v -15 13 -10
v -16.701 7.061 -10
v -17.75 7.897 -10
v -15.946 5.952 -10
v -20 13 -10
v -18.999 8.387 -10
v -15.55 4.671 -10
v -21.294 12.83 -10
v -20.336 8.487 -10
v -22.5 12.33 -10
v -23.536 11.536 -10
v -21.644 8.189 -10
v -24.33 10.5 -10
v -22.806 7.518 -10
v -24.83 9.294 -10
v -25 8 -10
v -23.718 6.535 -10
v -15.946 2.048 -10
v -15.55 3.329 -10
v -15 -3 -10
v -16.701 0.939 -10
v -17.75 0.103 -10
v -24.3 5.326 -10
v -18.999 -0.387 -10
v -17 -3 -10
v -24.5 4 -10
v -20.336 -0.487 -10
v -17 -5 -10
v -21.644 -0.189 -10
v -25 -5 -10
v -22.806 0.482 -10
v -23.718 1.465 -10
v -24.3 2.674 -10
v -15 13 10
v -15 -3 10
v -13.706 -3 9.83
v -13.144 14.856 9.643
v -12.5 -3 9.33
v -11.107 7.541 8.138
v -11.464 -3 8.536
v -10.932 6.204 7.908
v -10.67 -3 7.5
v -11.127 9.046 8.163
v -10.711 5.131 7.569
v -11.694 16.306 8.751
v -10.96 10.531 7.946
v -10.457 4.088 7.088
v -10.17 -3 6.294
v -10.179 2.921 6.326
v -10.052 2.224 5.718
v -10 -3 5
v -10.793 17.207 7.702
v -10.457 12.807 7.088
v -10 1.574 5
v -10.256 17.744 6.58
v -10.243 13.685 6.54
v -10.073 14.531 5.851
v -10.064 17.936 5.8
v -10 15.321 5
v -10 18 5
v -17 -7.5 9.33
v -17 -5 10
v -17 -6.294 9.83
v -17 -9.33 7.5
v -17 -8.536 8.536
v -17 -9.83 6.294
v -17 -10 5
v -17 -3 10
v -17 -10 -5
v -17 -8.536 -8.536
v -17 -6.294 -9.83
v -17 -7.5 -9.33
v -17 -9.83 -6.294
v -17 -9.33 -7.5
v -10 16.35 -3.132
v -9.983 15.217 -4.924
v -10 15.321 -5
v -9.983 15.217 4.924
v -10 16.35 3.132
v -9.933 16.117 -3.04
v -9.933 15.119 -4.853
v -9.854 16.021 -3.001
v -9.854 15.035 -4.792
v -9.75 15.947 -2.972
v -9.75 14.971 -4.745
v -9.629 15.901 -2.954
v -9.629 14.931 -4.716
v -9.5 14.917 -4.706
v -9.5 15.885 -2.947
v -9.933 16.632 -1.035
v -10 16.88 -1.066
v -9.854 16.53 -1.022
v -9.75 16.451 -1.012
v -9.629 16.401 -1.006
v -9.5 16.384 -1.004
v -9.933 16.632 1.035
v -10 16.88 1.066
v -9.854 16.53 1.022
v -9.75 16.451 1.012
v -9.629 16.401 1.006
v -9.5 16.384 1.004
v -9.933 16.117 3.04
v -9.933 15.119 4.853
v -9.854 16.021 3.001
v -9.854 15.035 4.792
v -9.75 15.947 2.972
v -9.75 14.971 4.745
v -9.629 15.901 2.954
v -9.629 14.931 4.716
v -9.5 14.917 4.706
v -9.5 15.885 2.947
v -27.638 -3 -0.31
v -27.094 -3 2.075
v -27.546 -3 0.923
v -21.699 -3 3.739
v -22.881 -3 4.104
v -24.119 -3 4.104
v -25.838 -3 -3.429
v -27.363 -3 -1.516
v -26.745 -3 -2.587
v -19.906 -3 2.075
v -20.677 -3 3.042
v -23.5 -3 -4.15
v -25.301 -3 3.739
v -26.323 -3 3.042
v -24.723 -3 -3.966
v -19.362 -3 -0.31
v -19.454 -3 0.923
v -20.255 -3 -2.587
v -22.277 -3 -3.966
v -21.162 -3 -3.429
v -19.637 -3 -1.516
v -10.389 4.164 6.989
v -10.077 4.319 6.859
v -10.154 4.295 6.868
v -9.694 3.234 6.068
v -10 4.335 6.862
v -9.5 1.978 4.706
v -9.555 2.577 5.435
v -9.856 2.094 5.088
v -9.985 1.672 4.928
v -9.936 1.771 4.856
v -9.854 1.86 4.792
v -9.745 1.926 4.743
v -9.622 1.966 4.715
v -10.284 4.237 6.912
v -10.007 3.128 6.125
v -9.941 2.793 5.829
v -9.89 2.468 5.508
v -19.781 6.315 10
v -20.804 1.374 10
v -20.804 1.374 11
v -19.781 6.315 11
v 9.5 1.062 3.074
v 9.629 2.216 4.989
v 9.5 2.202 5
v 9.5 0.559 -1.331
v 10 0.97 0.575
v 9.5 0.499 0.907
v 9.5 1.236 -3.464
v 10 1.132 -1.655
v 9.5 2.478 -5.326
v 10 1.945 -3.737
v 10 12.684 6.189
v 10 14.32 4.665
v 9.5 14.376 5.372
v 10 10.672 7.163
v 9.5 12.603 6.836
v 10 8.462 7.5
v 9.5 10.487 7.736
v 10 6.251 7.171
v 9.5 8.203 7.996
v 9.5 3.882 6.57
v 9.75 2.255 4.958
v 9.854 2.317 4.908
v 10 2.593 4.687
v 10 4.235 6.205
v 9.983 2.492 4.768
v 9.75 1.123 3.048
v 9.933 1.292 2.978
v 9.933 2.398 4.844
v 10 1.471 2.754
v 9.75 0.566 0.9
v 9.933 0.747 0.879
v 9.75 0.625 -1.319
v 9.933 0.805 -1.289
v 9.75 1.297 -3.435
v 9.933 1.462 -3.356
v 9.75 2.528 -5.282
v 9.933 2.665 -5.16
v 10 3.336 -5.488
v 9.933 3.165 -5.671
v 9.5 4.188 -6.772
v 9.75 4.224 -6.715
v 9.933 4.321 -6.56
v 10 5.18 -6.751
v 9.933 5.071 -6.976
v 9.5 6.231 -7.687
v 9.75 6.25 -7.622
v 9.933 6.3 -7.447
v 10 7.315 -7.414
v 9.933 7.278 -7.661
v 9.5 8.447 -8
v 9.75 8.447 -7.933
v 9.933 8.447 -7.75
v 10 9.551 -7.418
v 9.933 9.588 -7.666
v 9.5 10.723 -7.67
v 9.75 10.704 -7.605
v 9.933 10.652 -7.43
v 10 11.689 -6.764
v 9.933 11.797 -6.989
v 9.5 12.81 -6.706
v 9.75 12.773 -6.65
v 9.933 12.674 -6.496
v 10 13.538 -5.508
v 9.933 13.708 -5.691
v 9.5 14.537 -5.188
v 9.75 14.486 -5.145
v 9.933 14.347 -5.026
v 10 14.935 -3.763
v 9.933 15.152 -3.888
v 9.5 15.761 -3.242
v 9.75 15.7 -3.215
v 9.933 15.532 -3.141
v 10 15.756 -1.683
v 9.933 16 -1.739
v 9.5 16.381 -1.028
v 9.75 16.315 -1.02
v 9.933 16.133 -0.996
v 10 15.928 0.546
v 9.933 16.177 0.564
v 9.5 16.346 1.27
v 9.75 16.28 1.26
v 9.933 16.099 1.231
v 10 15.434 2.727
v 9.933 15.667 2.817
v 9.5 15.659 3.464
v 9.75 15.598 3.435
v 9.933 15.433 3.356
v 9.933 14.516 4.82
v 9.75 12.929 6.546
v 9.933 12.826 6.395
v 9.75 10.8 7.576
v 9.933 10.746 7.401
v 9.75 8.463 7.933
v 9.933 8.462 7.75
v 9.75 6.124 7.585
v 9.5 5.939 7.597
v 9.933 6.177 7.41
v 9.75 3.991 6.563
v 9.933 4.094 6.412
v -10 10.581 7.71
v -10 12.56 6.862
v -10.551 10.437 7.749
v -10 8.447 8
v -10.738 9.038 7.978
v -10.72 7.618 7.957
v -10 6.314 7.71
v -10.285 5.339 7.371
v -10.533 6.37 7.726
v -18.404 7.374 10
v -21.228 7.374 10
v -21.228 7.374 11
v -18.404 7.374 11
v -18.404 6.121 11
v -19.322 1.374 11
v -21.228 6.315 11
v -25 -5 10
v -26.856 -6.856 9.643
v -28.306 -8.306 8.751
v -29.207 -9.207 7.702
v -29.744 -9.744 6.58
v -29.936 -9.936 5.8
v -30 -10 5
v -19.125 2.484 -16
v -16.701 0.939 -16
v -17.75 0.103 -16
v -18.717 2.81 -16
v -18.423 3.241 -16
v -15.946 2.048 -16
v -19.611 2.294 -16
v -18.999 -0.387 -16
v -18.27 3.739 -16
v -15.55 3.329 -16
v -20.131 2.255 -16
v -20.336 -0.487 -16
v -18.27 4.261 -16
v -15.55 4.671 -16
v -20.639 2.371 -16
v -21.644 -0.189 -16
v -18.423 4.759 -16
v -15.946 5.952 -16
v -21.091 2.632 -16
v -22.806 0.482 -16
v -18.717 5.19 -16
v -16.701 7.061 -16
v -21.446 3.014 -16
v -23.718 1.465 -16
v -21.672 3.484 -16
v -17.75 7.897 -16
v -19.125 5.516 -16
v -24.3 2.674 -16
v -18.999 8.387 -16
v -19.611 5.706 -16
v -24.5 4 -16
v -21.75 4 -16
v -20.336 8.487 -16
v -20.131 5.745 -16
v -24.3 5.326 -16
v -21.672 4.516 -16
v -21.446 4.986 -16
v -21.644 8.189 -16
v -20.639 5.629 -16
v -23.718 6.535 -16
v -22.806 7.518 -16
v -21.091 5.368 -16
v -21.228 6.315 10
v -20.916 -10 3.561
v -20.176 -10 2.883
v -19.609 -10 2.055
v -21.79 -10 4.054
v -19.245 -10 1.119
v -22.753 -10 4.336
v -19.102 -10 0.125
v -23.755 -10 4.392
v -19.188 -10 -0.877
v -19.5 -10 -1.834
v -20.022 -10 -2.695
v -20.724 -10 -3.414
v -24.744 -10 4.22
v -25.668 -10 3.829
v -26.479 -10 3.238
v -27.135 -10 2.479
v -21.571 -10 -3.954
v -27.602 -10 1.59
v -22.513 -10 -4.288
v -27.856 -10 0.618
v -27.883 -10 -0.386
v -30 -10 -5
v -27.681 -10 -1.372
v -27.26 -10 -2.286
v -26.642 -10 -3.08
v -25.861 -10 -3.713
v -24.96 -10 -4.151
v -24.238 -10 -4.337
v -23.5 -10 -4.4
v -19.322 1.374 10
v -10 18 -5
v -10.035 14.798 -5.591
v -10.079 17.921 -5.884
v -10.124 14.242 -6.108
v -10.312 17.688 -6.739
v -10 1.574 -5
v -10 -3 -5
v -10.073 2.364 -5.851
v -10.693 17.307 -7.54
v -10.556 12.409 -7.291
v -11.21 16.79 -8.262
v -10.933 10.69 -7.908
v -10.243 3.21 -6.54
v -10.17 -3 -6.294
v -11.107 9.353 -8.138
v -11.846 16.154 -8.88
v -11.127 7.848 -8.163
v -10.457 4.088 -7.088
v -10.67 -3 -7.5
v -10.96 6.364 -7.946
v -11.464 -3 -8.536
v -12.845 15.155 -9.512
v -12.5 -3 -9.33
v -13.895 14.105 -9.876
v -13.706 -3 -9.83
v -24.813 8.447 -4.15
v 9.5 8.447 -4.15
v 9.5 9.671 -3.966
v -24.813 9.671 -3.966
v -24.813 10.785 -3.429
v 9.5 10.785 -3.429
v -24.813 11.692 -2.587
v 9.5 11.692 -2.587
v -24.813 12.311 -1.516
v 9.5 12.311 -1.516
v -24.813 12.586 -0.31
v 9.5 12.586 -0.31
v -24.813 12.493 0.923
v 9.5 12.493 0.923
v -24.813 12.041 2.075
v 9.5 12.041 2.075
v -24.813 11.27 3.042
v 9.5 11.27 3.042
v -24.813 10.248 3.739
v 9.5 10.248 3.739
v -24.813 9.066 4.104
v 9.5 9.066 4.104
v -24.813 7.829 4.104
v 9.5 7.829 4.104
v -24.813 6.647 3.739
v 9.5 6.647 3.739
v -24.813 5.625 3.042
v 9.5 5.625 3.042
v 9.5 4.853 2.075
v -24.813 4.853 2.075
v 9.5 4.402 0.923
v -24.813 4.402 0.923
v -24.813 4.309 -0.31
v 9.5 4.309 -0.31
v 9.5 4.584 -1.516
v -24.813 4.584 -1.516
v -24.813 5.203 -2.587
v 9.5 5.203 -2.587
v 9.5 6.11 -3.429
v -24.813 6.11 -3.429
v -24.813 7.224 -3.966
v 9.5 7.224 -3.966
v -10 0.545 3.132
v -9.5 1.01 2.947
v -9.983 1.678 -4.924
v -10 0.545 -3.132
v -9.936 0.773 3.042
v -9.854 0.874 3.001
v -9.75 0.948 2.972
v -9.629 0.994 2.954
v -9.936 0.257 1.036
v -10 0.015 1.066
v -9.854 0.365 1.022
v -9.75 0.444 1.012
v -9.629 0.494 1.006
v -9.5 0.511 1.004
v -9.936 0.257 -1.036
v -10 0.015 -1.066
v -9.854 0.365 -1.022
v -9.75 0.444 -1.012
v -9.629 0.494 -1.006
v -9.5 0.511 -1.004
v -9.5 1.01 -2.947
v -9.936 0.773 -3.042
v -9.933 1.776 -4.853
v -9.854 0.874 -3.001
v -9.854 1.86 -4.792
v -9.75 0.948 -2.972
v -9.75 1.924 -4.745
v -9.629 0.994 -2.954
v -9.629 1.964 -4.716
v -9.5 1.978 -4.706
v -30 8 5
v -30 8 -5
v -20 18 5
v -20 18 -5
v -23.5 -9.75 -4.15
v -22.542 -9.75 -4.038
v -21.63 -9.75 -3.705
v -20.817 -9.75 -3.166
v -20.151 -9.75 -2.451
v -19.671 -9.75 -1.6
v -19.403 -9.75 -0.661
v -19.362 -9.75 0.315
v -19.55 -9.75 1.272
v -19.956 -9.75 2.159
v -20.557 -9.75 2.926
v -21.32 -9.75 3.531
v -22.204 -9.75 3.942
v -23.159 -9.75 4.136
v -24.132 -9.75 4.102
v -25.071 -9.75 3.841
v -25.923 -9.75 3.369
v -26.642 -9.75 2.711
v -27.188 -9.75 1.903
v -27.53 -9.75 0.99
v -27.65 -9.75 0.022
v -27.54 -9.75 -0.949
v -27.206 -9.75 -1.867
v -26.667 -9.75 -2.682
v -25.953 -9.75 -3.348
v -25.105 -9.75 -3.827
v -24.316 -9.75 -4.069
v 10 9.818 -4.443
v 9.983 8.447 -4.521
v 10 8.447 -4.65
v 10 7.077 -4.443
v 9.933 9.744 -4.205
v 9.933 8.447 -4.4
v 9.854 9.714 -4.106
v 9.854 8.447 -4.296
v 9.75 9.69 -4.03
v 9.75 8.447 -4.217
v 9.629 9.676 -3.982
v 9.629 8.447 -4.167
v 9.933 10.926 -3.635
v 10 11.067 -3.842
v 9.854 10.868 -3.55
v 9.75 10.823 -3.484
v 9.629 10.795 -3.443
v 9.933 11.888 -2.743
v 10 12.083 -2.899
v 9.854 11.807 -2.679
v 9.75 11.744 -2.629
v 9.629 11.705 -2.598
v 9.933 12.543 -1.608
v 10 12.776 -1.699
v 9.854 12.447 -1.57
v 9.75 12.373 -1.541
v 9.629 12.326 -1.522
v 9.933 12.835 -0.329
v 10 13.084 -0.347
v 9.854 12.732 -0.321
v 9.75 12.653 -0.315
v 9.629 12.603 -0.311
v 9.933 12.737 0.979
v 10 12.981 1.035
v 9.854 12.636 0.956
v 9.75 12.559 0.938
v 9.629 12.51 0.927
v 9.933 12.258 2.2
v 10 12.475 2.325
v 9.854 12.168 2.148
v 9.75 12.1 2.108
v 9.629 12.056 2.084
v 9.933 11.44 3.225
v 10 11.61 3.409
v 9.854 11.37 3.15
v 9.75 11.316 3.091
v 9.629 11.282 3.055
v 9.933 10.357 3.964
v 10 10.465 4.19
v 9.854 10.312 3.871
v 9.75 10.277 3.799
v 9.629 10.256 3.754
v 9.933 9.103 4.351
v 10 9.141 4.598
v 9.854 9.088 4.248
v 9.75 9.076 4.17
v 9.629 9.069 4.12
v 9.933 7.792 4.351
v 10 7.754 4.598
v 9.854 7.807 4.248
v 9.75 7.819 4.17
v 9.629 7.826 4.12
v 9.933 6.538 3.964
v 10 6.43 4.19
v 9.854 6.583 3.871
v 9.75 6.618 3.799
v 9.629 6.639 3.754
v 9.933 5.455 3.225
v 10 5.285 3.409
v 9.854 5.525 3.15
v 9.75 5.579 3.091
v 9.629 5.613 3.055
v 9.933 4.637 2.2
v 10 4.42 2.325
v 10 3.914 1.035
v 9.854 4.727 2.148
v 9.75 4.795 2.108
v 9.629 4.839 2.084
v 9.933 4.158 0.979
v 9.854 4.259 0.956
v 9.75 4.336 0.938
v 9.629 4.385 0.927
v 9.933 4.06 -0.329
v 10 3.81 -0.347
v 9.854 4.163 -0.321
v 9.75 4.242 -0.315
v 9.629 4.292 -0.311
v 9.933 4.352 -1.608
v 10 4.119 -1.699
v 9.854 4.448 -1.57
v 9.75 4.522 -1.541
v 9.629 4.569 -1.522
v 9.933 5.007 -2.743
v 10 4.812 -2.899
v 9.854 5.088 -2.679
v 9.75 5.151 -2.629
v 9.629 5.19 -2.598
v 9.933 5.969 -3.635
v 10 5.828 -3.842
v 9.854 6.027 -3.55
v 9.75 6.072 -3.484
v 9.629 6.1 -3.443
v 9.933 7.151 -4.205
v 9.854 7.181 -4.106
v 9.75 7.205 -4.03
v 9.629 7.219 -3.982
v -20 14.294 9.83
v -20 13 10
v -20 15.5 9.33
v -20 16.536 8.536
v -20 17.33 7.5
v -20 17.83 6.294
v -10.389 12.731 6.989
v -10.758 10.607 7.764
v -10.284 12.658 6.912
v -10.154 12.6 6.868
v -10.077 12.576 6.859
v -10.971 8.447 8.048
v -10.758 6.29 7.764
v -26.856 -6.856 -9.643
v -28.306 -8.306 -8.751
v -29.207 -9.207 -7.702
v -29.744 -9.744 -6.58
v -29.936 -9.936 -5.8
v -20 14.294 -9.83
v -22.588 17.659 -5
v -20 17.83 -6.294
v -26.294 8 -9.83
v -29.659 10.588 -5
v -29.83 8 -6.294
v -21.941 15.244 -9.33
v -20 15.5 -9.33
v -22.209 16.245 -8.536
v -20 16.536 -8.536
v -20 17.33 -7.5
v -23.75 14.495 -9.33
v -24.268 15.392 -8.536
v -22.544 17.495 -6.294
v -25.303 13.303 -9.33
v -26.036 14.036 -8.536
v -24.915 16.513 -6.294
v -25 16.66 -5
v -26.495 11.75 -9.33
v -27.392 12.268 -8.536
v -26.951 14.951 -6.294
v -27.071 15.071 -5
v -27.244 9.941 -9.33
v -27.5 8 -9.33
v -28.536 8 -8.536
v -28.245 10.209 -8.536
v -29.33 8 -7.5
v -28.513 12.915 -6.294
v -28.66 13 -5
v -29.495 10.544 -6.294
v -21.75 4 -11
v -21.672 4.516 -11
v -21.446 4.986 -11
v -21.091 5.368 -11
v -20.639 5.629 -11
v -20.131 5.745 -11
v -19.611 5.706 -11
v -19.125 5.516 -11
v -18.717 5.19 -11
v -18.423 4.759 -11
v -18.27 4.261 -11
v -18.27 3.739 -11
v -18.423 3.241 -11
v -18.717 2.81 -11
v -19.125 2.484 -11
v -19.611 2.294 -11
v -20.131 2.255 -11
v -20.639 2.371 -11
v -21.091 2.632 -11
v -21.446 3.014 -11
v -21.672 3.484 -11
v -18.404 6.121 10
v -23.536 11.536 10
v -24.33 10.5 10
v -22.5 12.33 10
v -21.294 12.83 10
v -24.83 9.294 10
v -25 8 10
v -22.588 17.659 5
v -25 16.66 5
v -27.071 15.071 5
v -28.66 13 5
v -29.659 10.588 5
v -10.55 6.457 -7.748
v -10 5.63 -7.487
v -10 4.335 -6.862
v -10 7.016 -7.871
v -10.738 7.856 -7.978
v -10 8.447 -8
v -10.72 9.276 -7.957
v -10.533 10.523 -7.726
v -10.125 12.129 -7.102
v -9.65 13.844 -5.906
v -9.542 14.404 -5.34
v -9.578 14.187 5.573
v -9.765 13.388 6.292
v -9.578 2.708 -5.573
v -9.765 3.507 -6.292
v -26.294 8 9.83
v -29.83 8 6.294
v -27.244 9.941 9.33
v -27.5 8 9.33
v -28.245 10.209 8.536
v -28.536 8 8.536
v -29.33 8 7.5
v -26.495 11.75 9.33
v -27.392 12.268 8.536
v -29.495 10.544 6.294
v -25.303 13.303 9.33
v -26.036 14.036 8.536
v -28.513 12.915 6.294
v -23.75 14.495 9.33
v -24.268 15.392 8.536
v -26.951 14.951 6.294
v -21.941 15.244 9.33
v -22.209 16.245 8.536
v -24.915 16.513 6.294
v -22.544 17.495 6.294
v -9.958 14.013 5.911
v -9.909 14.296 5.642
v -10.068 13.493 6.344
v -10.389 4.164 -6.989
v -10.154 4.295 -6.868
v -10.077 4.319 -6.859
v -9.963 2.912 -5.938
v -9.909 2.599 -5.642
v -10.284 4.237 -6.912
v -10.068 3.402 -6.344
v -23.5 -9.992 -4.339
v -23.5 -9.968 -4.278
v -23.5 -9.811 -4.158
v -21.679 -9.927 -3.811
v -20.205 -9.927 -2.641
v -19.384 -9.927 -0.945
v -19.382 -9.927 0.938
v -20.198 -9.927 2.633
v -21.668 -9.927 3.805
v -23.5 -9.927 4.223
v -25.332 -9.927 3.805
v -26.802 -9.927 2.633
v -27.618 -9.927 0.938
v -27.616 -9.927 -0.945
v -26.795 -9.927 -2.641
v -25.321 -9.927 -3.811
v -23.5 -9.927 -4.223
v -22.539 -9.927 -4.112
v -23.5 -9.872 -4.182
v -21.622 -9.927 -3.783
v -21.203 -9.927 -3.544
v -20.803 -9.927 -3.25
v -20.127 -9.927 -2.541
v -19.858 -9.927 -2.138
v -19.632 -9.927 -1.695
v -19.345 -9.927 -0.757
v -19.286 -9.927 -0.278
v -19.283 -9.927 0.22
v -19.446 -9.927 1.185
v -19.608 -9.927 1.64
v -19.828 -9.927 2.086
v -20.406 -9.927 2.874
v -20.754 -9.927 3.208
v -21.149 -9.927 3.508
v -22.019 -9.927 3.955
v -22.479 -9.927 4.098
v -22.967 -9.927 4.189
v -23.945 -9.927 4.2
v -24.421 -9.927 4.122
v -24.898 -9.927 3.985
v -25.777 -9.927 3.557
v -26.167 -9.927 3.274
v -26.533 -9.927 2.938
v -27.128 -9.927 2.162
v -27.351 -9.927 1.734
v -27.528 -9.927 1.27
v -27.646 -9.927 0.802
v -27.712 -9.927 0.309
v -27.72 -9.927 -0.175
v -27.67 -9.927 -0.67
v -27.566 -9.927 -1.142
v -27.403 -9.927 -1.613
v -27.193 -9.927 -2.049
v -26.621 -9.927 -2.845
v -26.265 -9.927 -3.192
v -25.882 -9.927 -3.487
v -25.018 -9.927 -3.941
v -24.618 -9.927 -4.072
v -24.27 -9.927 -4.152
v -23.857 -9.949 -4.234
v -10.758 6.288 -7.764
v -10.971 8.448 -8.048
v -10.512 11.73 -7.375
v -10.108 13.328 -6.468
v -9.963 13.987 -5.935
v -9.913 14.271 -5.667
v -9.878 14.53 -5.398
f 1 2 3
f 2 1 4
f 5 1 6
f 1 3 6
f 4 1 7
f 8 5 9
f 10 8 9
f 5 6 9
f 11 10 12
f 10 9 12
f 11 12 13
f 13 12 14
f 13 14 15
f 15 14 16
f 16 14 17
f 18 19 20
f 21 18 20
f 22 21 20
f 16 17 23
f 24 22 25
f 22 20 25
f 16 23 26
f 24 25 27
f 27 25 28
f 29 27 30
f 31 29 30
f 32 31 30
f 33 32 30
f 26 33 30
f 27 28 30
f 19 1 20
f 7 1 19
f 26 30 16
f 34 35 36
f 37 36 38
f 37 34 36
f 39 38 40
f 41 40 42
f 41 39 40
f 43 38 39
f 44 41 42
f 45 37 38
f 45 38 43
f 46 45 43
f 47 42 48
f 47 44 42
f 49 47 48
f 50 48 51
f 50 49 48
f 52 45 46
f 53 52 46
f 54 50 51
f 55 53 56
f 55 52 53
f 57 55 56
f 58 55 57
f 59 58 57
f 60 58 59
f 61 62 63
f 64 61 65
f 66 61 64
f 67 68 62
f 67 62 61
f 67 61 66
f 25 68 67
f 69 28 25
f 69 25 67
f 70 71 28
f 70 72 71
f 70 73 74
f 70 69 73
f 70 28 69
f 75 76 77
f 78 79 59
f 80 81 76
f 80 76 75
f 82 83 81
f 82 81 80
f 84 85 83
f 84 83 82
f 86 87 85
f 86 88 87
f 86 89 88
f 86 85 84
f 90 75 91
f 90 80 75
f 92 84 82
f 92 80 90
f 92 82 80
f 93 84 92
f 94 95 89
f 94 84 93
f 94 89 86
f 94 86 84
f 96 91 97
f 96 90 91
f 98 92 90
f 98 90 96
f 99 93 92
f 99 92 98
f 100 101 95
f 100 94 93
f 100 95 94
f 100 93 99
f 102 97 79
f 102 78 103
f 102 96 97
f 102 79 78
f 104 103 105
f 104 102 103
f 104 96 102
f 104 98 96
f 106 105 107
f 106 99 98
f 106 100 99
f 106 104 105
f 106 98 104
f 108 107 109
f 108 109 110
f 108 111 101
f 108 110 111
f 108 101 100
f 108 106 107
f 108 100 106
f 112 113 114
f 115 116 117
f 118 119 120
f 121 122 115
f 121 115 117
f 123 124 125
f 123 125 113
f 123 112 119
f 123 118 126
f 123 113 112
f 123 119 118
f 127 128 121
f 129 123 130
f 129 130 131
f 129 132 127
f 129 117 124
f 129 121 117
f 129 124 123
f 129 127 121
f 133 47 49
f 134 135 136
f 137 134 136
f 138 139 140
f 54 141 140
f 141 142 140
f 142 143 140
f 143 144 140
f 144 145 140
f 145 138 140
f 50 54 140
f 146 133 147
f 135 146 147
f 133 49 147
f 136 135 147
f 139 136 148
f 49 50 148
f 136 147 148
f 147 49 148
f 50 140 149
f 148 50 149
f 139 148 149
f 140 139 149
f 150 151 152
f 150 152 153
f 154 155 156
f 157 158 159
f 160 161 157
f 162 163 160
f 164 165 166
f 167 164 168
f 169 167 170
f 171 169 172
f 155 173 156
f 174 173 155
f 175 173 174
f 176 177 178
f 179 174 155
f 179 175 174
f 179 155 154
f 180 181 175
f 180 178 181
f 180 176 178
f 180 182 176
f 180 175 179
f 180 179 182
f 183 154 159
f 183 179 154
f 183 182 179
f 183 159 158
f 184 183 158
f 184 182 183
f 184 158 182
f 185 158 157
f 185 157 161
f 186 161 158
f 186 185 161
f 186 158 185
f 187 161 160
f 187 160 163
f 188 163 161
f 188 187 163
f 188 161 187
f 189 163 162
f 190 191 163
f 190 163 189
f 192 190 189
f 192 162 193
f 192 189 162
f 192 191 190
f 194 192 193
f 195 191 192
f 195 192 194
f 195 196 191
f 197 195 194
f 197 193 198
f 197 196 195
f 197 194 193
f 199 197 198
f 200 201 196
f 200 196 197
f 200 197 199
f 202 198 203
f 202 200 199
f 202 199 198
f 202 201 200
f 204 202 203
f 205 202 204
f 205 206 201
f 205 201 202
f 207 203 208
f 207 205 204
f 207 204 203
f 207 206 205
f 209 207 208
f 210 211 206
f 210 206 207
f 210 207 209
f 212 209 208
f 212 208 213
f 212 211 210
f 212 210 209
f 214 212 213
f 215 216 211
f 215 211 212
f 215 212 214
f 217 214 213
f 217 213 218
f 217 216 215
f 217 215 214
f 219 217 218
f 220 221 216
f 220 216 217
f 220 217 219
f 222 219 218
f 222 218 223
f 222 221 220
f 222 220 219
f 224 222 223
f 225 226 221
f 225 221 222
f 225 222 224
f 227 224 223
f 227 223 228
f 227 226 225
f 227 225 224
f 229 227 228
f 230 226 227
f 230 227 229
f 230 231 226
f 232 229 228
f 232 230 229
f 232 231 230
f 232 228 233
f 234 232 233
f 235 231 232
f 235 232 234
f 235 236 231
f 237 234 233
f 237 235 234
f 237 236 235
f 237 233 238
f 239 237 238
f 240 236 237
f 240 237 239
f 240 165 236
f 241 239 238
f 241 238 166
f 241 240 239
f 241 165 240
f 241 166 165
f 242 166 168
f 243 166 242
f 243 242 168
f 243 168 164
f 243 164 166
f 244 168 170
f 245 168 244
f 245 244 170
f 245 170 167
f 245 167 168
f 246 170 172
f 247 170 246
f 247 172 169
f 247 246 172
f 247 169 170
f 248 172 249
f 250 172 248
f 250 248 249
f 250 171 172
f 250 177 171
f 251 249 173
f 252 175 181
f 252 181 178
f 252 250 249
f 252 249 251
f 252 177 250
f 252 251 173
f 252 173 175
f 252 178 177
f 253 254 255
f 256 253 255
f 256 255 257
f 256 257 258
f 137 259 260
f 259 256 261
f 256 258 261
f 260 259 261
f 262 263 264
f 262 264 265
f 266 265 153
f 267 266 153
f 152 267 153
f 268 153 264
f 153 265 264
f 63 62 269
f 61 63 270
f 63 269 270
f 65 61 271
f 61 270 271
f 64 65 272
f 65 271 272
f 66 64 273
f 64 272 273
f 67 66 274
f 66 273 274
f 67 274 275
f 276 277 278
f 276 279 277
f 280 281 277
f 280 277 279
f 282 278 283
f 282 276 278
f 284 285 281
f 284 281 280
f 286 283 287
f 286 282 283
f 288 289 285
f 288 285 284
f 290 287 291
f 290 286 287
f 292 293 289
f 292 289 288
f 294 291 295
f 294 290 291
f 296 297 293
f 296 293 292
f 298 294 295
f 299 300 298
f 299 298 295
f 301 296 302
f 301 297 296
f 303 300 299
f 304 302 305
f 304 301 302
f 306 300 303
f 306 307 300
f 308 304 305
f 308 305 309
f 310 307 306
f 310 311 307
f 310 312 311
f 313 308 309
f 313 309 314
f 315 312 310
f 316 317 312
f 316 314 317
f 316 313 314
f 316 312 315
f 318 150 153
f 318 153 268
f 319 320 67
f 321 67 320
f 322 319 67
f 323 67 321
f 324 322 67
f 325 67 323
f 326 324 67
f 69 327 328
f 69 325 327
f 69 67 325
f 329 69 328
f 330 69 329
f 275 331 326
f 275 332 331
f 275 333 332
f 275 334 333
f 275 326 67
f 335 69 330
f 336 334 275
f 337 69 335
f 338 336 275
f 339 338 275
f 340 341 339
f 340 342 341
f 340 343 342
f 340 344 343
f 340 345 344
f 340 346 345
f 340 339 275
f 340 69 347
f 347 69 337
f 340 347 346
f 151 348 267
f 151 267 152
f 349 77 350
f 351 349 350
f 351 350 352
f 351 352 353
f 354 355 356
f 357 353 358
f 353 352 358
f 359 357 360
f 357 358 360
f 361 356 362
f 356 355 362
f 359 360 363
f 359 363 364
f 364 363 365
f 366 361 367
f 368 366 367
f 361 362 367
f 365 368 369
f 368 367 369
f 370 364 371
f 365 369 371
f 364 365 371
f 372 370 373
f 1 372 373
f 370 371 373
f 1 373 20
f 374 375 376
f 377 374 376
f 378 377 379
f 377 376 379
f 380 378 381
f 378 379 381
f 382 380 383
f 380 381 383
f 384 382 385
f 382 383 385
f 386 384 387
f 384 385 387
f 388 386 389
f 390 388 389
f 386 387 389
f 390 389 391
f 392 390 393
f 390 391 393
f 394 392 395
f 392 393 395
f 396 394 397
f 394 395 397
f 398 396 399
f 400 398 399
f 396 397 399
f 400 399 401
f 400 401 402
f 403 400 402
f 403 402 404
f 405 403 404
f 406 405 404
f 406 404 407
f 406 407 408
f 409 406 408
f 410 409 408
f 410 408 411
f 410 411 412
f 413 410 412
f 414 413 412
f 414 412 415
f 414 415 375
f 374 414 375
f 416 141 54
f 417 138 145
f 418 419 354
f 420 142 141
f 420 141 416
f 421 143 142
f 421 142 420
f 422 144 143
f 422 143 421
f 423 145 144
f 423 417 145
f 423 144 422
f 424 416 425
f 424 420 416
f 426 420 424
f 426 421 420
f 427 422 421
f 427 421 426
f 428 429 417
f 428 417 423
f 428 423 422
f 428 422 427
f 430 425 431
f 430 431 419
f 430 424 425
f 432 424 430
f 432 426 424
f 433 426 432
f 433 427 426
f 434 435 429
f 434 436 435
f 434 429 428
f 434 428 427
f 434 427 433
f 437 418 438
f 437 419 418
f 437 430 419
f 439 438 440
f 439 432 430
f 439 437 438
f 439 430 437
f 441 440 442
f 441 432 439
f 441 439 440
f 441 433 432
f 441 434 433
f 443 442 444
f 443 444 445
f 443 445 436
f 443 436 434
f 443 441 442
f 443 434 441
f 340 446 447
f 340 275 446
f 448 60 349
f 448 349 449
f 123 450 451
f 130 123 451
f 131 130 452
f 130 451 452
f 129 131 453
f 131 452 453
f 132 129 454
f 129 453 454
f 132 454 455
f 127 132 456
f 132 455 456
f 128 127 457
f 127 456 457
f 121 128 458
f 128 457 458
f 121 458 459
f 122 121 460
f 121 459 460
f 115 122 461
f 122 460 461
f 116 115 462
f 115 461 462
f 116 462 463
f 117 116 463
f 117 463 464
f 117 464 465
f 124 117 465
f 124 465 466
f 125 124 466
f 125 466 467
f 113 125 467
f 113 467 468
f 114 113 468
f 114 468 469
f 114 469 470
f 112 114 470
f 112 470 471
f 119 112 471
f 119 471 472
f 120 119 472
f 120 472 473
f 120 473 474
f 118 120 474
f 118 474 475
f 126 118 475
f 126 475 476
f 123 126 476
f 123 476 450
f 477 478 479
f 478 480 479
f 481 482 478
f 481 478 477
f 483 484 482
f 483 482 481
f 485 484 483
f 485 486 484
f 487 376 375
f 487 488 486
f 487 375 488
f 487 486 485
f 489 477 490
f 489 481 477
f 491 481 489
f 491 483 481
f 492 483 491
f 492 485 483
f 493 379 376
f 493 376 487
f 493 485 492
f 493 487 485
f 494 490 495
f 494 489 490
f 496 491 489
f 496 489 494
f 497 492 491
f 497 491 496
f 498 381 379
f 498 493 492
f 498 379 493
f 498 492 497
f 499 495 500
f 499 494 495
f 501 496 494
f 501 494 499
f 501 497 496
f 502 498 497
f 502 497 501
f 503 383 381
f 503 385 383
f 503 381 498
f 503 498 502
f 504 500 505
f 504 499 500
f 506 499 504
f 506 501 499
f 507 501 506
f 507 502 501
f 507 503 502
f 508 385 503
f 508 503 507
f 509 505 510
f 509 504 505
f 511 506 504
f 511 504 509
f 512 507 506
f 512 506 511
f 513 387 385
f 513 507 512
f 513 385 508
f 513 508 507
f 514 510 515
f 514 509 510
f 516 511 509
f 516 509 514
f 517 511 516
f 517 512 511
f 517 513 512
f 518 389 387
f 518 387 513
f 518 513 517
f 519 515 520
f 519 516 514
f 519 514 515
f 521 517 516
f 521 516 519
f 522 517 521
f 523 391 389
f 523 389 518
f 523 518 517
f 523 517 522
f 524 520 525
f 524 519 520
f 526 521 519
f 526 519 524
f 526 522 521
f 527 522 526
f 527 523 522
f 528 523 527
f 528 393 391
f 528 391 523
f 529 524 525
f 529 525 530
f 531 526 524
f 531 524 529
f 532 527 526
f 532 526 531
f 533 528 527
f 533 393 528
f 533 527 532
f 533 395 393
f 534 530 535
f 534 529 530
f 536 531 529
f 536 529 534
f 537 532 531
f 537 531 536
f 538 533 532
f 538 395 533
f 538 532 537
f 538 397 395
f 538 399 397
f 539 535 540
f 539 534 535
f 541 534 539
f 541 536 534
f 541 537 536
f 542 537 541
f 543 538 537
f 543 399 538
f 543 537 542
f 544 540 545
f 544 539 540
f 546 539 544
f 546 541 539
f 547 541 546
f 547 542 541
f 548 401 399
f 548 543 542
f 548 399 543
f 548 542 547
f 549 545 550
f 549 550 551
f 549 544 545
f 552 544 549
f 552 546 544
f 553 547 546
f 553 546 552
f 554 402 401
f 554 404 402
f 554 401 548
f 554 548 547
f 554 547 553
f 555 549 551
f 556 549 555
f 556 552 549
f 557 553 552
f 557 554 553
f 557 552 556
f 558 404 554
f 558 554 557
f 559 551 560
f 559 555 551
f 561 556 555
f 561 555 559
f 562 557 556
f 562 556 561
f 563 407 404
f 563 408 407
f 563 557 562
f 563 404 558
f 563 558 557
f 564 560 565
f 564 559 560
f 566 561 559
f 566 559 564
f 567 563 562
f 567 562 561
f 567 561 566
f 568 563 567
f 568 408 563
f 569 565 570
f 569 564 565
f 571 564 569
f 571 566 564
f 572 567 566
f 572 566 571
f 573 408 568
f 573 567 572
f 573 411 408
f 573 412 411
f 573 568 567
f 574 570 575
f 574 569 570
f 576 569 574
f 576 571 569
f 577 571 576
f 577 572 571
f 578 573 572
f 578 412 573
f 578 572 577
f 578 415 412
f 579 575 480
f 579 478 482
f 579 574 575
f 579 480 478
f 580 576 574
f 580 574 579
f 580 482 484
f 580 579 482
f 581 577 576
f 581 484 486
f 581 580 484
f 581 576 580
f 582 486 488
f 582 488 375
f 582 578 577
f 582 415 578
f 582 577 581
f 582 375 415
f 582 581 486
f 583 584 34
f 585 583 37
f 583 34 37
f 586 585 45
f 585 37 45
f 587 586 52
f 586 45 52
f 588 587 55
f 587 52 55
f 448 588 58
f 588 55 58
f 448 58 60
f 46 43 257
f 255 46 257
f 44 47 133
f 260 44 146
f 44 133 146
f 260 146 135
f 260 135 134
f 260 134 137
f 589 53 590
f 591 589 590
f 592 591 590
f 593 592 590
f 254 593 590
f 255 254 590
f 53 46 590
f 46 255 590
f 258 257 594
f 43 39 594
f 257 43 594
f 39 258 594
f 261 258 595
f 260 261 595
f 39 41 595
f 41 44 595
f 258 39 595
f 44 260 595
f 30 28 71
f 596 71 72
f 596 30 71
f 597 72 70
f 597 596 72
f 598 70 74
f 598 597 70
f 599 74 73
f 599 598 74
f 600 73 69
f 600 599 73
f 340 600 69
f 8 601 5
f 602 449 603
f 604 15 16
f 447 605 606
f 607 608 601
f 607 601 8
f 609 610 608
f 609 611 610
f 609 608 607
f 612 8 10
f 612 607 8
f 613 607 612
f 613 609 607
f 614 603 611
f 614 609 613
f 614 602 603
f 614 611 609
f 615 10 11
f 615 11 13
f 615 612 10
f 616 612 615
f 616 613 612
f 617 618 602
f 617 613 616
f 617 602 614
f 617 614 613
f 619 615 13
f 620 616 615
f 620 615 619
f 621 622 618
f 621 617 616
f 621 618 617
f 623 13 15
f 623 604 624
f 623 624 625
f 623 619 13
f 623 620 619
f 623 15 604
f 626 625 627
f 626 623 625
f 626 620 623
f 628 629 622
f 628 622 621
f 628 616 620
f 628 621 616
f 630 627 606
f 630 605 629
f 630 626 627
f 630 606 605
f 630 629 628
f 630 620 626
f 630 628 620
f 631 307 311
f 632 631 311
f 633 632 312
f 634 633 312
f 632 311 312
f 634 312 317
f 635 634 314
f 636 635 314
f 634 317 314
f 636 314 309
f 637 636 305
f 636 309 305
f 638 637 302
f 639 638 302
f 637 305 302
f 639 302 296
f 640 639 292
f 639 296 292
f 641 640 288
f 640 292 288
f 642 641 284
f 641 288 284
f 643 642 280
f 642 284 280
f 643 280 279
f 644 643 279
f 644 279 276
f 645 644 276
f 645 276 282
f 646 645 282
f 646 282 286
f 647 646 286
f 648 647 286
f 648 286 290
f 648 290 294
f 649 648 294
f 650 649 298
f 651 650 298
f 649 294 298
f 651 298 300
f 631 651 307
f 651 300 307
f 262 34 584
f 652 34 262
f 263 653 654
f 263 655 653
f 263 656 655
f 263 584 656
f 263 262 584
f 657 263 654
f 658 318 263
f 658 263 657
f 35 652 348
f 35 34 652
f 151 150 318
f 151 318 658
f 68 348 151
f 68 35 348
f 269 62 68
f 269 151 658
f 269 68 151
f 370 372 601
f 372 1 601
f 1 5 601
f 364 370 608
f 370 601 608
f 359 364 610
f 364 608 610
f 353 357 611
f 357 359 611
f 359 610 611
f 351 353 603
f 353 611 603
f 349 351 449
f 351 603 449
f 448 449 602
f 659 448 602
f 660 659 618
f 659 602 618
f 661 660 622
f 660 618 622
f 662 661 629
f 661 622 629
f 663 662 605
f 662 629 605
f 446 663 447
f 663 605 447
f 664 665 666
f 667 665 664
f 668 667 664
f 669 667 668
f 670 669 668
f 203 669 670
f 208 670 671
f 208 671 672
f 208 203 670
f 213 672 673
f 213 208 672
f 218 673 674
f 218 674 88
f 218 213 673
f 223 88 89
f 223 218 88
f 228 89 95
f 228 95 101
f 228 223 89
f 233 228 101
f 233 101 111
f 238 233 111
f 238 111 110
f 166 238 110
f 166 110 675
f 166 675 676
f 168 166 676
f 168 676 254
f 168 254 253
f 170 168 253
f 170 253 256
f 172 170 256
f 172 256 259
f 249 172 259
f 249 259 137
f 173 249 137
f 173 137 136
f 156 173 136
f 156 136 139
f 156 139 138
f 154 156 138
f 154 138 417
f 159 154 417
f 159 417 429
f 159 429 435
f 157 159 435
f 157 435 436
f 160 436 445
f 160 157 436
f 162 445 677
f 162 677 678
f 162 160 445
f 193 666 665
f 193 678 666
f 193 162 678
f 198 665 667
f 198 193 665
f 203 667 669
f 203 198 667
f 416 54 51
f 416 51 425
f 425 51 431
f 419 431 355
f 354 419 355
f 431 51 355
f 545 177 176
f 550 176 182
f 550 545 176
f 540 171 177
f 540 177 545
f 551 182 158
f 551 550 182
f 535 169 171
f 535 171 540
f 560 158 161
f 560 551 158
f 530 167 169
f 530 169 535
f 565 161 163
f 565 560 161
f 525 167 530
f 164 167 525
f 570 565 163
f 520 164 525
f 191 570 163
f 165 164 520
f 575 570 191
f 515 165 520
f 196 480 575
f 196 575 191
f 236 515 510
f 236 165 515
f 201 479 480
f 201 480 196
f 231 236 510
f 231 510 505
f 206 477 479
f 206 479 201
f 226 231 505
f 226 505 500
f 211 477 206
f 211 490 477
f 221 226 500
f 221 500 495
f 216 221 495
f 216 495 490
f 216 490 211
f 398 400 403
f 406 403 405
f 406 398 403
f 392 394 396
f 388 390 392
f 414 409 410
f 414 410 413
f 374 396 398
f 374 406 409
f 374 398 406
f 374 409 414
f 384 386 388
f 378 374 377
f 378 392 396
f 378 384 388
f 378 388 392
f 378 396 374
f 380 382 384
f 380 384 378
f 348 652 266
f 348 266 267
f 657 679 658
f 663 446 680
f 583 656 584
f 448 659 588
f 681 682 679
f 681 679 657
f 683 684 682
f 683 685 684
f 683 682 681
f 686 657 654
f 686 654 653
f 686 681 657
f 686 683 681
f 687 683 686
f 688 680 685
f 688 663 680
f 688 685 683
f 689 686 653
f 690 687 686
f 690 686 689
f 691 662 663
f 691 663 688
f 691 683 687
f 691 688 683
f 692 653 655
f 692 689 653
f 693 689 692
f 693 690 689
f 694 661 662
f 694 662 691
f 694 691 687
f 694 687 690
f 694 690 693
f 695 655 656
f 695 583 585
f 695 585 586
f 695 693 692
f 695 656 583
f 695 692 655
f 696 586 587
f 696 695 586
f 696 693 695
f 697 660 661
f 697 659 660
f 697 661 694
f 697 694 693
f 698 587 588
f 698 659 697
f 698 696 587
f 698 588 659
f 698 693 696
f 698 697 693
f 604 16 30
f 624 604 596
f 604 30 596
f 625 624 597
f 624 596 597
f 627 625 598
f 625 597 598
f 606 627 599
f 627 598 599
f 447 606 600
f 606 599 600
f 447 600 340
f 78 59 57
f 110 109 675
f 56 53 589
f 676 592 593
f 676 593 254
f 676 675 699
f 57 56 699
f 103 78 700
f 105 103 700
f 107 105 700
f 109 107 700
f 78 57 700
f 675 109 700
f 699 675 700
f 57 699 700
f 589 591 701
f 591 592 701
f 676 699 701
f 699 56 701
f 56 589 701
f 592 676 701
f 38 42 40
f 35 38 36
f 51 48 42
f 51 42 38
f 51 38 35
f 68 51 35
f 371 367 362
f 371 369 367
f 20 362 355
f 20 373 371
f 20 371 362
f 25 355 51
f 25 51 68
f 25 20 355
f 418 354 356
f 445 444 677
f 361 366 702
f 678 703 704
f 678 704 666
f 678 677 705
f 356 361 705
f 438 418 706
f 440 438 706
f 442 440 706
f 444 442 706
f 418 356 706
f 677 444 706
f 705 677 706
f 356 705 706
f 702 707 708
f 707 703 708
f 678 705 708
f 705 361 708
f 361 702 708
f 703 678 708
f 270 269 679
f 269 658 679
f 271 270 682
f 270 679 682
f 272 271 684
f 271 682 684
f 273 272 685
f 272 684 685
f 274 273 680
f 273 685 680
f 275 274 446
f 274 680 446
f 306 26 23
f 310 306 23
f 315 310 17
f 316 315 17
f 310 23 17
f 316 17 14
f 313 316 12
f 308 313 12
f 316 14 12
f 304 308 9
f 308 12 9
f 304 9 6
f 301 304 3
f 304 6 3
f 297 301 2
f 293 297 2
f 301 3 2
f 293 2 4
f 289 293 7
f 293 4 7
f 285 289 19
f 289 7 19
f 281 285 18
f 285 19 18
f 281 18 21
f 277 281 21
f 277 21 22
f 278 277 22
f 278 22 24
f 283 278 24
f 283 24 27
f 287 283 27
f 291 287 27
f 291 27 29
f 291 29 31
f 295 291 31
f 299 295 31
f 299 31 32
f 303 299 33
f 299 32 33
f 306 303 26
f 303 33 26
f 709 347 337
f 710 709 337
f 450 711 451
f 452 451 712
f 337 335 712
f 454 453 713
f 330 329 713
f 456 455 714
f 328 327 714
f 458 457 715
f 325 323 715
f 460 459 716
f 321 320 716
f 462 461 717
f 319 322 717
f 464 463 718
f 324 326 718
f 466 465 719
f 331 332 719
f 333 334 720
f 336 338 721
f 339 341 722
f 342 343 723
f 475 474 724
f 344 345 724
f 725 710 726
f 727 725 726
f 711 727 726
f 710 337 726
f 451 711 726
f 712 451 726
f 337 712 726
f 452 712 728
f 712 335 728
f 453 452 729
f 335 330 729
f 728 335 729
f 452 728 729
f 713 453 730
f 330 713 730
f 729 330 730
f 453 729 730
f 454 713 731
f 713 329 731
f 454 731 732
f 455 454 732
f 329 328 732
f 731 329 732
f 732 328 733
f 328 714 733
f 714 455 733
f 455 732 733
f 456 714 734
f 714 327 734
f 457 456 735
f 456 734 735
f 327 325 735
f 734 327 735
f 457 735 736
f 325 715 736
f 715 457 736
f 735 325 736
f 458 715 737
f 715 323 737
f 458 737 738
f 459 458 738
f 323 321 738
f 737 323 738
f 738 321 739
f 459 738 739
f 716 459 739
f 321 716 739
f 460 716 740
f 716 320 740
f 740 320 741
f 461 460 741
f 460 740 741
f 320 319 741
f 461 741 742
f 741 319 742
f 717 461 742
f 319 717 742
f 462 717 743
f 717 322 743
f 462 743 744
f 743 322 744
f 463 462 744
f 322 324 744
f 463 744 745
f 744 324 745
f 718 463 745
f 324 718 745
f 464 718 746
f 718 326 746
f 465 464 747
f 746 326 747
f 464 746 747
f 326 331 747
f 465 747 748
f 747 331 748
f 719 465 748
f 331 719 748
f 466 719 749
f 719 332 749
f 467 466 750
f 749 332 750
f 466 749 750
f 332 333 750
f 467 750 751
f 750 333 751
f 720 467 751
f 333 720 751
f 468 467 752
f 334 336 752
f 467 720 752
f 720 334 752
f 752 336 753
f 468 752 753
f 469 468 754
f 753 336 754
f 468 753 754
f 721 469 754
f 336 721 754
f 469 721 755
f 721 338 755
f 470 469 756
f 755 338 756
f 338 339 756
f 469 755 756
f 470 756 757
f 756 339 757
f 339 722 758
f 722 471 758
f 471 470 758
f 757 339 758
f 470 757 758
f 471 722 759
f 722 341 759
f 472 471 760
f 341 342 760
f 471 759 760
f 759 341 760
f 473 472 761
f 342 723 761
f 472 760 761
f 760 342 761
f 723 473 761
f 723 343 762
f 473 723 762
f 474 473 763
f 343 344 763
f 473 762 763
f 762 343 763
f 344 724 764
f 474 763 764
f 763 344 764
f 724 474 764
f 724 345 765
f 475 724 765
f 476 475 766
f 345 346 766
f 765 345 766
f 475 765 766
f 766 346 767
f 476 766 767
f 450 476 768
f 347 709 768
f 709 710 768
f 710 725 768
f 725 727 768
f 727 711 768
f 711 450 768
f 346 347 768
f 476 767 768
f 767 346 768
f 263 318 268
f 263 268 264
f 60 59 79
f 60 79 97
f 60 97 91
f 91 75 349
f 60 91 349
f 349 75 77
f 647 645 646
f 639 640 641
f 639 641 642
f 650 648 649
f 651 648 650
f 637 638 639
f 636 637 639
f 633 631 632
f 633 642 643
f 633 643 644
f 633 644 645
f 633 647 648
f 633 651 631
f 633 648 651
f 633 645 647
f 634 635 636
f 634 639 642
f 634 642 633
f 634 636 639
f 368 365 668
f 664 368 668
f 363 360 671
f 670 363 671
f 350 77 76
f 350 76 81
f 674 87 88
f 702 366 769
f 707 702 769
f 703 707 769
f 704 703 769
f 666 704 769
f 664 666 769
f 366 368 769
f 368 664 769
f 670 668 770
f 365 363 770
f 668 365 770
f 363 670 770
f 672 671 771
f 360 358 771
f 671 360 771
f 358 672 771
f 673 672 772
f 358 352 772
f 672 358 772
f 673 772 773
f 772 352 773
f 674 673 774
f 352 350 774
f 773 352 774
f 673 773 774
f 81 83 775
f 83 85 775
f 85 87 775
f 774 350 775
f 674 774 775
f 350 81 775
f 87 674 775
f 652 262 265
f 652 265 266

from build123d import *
from build123d.topology import SkipClean

# Parameters (mm, degrees)
BOSS_EXTRU_1_DEPTH       = 10
BOSS_EXTRU_1_DEPTH_BACK  = 10
ESQUISSE2_R              = 4
ENL_V_MAT_EXTRU_1_DEPTH  = 7
ESQUISSE3_W              = 20
ESQUISSE3_H              = 20
BOSS_EXTRU_2_DEPTH       = 8
EMPREINTE1_START         = -10
EMPREINTE1_OUTLINE_R     = 4
EMPREINTE1_DEPTH         = 14.813354444
CONG_1_R                 = 10
CONG_2_R                 = 5
ESQUISSE4_R              = 4.5
BOSS_EXTRU_3_DEPTH       = 6
ESQUISSE5_R              = 1.75
ENL_V_MAT_EXTRU_2_DEPTH  = 5
CONG_3_R                 = 0.25
ESQUISSE6_R              = 4.15
ENL_V_MAT_EXTRU_3_DEPTH  = 14.813354444
ESQUISSE7_R              = 4.15
ENL_V_MAT_EXTRU_5_DEPTH  = 7
BOSS_EXTRU_4_OUTLINE_R   = 8
BOSS_EXTRU_4_OUTLINE_R_2 = 4.15
BOSS_EXTRU_4_DEPTH       = 20
BOSS_EXTRU_4_START       = -5
BOSS_EXTRU_4_2_DEPTH     = 5
CONG_4_R                 = 0.5
CONG_5_R                 = 0.5
ESQUISSE9_R              = 8
ESQUISSE9_R_2            = 4.15
BOSS_EXTRU_6_DEPTH       = 22
CONG_6_R                 = 0.5
CONG_7_R                 = 0.25
CONG_8_R                 = 0.5
BOSS_EXTRU_7_DEPTH       = 1


with BuildPart() as part:
    # Esquisse1 → Boss.-Extru.1 (new, two sides: drawn at the far end of the back side and taken through both)
    with BuildSketch(Plane.XY.offset(-BOSS_EXTRU_1_DEPTH_BACK)):
        Polygon((-3, -10), (10, -10), (10, 10), (-10, 10), (-10, -3), (-3, -3), align=None)
    extrude(amount=BOSS_EXTRU_1_DEPTH + BOSS_EXTRU_1_DEPTH_BACK)

    # Esquisse2 → Enlèv. mat.-Extru.1 (cut)
    with BuildSketch(Plane(origin=(0, -10, 0), x_dir=(-1, 0, 0), z_dir=(0, -1, 0))):
        with Locations(Location((-3.5, 0, 0), (0, 0, 90))):
            Circle(ESQUISSE2_R)
    extrude(amount=-ENL_V_MAT_EXTRU_1_DEPTH, mode=Mode.SUBTRACT)

    # Esquisse3 → Boss.-Extru.2 (add)
    with BuildSketch(Plane(origin=(0, 10, 0), x_dir=(1, 0, 0), z_dir=(0, 1, 0))):
        Rectangle(ESQUISSE3_W, ESQUISSE3_H)
    extrude(amount=BOSS_EXTRU_2_DEPTH)

    # Empreinte1: read off the stored shape, not the designer's step
    # Empreinte1 outline → Empreinte1 (cut)
    with BuildSketch(Plane.YZ.offset(EMPREINTE1_START)):
        with Locations((8.447491166, 0)):
            Circle(EMPREINTE1_OUTLINE_R)
    extrude(amount=EMPREINTE1_DEPTH, mode=Mode.SUBTRACT)

    # Congé1
    cong_1_edges = [part.edges().sort_by_distance(p)[0] for p in [
        (10, 18, 0),
    ]]
    fillet(cong_1_edges, radius=CONG_1_R)

    # Congé2
    cong_2_edges = [part.edges().sort_by_distance(p)[0] for p in [
        (-10, 7.5, -10),
        (10, -1, 10),
        (-10, 7.5, 10),
        (3.5, -10, 10),
        (3.5, -10, -10),
        (-5, 18, 10),
        (10, -1, -10),
        (-5, 18, -10),
        (7.071067812, 15.071067812, -10),
        (7.071067812, 15.071067812, 10),
    ]]
    fillet(cong_2_edges, radius=CONG_2_R)


with BuildPart() as body_2:
    # Symétrie1: mirrored copy
    add(part.part.mirror(Plane(origin=(-3, -10, -10), x_dir=(0, 0, 1), z_dir=(0, -1, 0))))


with BuildPart() as body_2_2:
    # Symétrie3: mirrored copy
    add(body_2.part.mirror(Plane(origin=(-10, -27.201842148, 0), x_dir=(0, 0, 1), z_dir=(-1, 0, 0))))


with BuildPart() as body_2_3:
    # Symétrie4: mirrored copy
    add(body_2_2.part.mirror(Plane(origin=(-17, -10, -10), x_dir=(0, 0, 1), z_dir=(0, 1, 0))))

    # Esquisse4 → Boss.-Extru.3 (add)
    with BuildSketch(Plane(origin=(0, 0, -10), x_dir=(-1, 0, 0), z_dir=(0, 0, -1))):
        with Locations((20, 4)):
            Circle(ESQUISSE4_R)
    extrude(amount=BOSS_EXTRU_3_DEPTH)

    # Esquisse5 → Enlèv. mat.-Extru.2 (cut)
    with BuildSketch(Plane(origin=(0, 0, -16), x_dir=(-1, 0, 0), z_dir=(0, 0, -1))):
        with Locations((20, 4)):
            Circle(ESQUISSE5_R)
    extrude(amount=-ENL_V_MAT_EXTRU_2_DEPTH, mode=Mode.SUBTRACT)

    # Congé3
    cong_3_edges = [body_2_3.edges().sort_by_distance(p)[0] for p in [
        (-23.5, -10, 4),
        (-10, 4.447491166, 0),
    ]]
    fillet(cong_3_edges, radius=CONG_3_R)

    # Esquisse6 → Enlèv. mat.-Extru.3 (cut)
    with BuildSketch(Plane(origin=(-10, 0, 0), x_dir=(0, 0, -1), z_dir=(1, 0, 0))):
        with Locations((0, 8.447491166)):
            Circle(ESQUISSE6_R)
    extrude(amount=-ENL_V_MAT_EXTRU_3_DEPTH, mode=Mode.SUBTRACT)

    # Esquisse7 → Enlèv. mat.-Extru.5 (cut)
    with BuildSketch(Plane.XZ.offset(10)):
        with Locations(Location((-23.5, 0, 0), (0, 0, 270))):
            Circle(ESQUISSE7_R)
    extrude(amount=-ENL_V_MAT_EXTRU_5_DEPTH, mode=Mode.SUBTRACT)

    # Boss.-Extru.4: read off the stored shape, not the designer's step
    # Boss.-Extru.4 outline → Boss.-Extru.4 (add)
    with BuildSketch(Plane(origin=(-10, 0, 0), x_dir=(0, 0, -1), z_dir=(1, 0, 0))):
        with Locations((0, 8.447491166)):
            Circle(BOSS_EXTRU_4_OUTLINE_R)
        with Locations((0, 8.447491166)):
            Circle(BOSS_EXTRU_4_OUTLINE_R_2, mode=Mode.SUBTRACT)
    extrude(amount=BOSS_EXTRU_4_DEPTH)

    # Boss.-Extru.4 2 outline → Boss.-Extru.4 2 (add)
    with BuildSketch(Plane(origin=(-10, 0, 0), x_dir=(0, 0, -1), z_dir=(1, 0, 0)).offset(BOSS_EXTRU_4_START)):
        with BuildLine():
            Line((-5, 2.202493167), (-5, 14.692489164))
            ThreePointArc((-5, 14.692489164), (-8, 8.447491166), (-5, 2.202493167))
        make_face()
    extrude(amount=BOSS_EXTRU_4_2_DEPTH)

    # Congé4
    cong_4_edges = [body_2_3.edges().sort_by_distance(p)[0] for p in [
        (10, 8.447491166, 8),
    ]]
    fillet(cong_4_edges, radius=CONG_4_R)

    # Congé5
    cong_5_edges = [body_2_3.edges().sort_by_distance(p)[0] for p in [
        (10, 8.447491166, 4.15),
    ]]
    fillet(cong_5_edges, radius=CONG_5_R)


with BuildPart() as boss_extru_6_tool:
    # Esquisse9 → Boss.-Extru.6 (new body)
    with SkipClean():  # the faces are left unmerged after this step: merging them gives an invalid solid
        with BuildSketch(Plane(origin=(10, 0, 0), x_dir=(0, 0, -1), z_dir=(1, 0, 0))):
            with Locations(Location((0, 8.447491166, 0), (0, 0, 231.317812547))):
                Circle(ESQUISSE9_R)
            with Locations((0, 8.447491166)):
                Circle(ESQUISSE9_R_2, mode=Mode.SUBTRACT)
        extrude(amount=-BOSS_EXTRU_6_DEPTH)


with BuildPart() as body_2_3_1:
    with SkipClean():  # the faces are left unmerged after this step: merging them gives an invalid solid
        add(body_2_3.part)


with BuildPart() as body_2_3_2:
    # Boss.-Extru.6: joined with boss_extru_6_tool
    with SkipClean():  # the faces are left unmerged after this step: merging them gives an invalid solid
        add(body_2_3_1.part.fuse(boss_extru_6_tool.part, tol=0.00001))

    # Congé6
    # the kernel refuses this fillet: 0.5 mm, written as the material it takes off along each edge
    with BuildSketch(Plane(origin=(10, 8.447491166, 0), x_dir=(0, 0, -1), z_dir=(0, -1, 0))) as cong_6_piece_1:
        with BuildLine():
            CenterArc((4.15 + CONG_6_R, -CONG_6_R), CONG_6_R, 90, 90)
            Line((4.15, -CONG_6_R), (4.15, 0))
            Line((4.15, 0), (4.15 + CONG_6_R, 0))
        make_face()
    revolve(axis=Axis((10, 8.447491166, 0), (1, 0, 0)), mode=Mode.SUBTRACT)
    with BuildSketch(Plane(origin=(10, 8.447491166, 0), x_dir=(0, -0.7806247498051386, 0.6249999999933319), z_dir=(0, 0.6249999999933319, 0.7806247498051386))) as cong_6_piece_2:
        with BuildLine():
            CenterArc((8 - CONG_6_R, -CONG_6_R), CONG_6_R, 360, 90)
            Line((8, -CONG_6_R), (8, 0))
            Line((8, 0), (8 - CONG_6_R, 0))
        make_face()
    revolve(axis=Axis((10, 8.447491166, 0), (1, 0, 0)), mode=Mode.SUBTRACT)

    # Congé7
    cong_7_edges = [body_2_3_2.edges().sort_by_distance(p)[0] for p in [
        (-23.5, -9.979128785, 4.15),
    ]]
    fillet(cong_7_edges, radius=CONG_7_R - 0.0001)  # a hair under: the kernel refuses the full size

    # Congé8
    cong_8_edges = [body_2_3_2.edges().sort_by_distance(p)[0] for p in [
        (-10, 16.447491166, 0),
        (-11, 8.447491166, -8),
        (-11, 8.447491165, 8),
    ]]
    fillet(cong_8_edges, radius=CONG_8_R)

    # Esquisse10 → Boss.-Extru.7 (add)
    with BuildSketch(Plane.XY.offset(10)):
        Polygon((-18.404253987, 7.373694741), (-18.404253987, 6.120753565), (-19.321901046, 1.373694741), (-20.804253987, 1.373694741), (-19.780724575, 6.314871212), (-21.227783399, 6.314871212), (-21.227783399, 7.373694741), align=None)
    extrude(amount=BOSS_EXTRU_7_DEPTH)


solid = body_2_3_2.part
